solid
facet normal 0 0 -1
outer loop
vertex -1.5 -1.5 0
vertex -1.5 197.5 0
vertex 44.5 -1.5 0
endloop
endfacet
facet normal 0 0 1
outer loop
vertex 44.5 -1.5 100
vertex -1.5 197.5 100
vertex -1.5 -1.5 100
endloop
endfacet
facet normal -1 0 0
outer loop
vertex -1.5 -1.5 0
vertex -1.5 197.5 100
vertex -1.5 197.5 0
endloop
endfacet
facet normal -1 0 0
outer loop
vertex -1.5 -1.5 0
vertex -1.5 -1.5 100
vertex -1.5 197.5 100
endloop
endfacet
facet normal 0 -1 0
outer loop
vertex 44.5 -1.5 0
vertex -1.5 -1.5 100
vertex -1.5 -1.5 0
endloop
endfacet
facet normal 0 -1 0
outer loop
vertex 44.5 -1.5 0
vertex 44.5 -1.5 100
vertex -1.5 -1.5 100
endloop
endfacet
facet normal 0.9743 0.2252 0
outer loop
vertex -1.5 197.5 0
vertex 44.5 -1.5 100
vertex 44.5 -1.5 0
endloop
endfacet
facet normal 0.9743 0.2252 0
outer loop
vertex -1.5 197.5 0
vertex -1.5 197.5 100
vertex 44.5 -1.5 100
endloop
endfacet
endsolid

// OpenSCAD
chord = 43;
spinebase = 2.13;
spinetip = .82;
spineLen = 8 * 24.5;
thickness = 1.5;


linear_extrude([0,0,thickness*2 + spinebase])
{
polygon(points=[[0-thickness,0-thickness],[chord+thickness,0-thickness],[0-thickness,spineLen+thickness]]);
}
